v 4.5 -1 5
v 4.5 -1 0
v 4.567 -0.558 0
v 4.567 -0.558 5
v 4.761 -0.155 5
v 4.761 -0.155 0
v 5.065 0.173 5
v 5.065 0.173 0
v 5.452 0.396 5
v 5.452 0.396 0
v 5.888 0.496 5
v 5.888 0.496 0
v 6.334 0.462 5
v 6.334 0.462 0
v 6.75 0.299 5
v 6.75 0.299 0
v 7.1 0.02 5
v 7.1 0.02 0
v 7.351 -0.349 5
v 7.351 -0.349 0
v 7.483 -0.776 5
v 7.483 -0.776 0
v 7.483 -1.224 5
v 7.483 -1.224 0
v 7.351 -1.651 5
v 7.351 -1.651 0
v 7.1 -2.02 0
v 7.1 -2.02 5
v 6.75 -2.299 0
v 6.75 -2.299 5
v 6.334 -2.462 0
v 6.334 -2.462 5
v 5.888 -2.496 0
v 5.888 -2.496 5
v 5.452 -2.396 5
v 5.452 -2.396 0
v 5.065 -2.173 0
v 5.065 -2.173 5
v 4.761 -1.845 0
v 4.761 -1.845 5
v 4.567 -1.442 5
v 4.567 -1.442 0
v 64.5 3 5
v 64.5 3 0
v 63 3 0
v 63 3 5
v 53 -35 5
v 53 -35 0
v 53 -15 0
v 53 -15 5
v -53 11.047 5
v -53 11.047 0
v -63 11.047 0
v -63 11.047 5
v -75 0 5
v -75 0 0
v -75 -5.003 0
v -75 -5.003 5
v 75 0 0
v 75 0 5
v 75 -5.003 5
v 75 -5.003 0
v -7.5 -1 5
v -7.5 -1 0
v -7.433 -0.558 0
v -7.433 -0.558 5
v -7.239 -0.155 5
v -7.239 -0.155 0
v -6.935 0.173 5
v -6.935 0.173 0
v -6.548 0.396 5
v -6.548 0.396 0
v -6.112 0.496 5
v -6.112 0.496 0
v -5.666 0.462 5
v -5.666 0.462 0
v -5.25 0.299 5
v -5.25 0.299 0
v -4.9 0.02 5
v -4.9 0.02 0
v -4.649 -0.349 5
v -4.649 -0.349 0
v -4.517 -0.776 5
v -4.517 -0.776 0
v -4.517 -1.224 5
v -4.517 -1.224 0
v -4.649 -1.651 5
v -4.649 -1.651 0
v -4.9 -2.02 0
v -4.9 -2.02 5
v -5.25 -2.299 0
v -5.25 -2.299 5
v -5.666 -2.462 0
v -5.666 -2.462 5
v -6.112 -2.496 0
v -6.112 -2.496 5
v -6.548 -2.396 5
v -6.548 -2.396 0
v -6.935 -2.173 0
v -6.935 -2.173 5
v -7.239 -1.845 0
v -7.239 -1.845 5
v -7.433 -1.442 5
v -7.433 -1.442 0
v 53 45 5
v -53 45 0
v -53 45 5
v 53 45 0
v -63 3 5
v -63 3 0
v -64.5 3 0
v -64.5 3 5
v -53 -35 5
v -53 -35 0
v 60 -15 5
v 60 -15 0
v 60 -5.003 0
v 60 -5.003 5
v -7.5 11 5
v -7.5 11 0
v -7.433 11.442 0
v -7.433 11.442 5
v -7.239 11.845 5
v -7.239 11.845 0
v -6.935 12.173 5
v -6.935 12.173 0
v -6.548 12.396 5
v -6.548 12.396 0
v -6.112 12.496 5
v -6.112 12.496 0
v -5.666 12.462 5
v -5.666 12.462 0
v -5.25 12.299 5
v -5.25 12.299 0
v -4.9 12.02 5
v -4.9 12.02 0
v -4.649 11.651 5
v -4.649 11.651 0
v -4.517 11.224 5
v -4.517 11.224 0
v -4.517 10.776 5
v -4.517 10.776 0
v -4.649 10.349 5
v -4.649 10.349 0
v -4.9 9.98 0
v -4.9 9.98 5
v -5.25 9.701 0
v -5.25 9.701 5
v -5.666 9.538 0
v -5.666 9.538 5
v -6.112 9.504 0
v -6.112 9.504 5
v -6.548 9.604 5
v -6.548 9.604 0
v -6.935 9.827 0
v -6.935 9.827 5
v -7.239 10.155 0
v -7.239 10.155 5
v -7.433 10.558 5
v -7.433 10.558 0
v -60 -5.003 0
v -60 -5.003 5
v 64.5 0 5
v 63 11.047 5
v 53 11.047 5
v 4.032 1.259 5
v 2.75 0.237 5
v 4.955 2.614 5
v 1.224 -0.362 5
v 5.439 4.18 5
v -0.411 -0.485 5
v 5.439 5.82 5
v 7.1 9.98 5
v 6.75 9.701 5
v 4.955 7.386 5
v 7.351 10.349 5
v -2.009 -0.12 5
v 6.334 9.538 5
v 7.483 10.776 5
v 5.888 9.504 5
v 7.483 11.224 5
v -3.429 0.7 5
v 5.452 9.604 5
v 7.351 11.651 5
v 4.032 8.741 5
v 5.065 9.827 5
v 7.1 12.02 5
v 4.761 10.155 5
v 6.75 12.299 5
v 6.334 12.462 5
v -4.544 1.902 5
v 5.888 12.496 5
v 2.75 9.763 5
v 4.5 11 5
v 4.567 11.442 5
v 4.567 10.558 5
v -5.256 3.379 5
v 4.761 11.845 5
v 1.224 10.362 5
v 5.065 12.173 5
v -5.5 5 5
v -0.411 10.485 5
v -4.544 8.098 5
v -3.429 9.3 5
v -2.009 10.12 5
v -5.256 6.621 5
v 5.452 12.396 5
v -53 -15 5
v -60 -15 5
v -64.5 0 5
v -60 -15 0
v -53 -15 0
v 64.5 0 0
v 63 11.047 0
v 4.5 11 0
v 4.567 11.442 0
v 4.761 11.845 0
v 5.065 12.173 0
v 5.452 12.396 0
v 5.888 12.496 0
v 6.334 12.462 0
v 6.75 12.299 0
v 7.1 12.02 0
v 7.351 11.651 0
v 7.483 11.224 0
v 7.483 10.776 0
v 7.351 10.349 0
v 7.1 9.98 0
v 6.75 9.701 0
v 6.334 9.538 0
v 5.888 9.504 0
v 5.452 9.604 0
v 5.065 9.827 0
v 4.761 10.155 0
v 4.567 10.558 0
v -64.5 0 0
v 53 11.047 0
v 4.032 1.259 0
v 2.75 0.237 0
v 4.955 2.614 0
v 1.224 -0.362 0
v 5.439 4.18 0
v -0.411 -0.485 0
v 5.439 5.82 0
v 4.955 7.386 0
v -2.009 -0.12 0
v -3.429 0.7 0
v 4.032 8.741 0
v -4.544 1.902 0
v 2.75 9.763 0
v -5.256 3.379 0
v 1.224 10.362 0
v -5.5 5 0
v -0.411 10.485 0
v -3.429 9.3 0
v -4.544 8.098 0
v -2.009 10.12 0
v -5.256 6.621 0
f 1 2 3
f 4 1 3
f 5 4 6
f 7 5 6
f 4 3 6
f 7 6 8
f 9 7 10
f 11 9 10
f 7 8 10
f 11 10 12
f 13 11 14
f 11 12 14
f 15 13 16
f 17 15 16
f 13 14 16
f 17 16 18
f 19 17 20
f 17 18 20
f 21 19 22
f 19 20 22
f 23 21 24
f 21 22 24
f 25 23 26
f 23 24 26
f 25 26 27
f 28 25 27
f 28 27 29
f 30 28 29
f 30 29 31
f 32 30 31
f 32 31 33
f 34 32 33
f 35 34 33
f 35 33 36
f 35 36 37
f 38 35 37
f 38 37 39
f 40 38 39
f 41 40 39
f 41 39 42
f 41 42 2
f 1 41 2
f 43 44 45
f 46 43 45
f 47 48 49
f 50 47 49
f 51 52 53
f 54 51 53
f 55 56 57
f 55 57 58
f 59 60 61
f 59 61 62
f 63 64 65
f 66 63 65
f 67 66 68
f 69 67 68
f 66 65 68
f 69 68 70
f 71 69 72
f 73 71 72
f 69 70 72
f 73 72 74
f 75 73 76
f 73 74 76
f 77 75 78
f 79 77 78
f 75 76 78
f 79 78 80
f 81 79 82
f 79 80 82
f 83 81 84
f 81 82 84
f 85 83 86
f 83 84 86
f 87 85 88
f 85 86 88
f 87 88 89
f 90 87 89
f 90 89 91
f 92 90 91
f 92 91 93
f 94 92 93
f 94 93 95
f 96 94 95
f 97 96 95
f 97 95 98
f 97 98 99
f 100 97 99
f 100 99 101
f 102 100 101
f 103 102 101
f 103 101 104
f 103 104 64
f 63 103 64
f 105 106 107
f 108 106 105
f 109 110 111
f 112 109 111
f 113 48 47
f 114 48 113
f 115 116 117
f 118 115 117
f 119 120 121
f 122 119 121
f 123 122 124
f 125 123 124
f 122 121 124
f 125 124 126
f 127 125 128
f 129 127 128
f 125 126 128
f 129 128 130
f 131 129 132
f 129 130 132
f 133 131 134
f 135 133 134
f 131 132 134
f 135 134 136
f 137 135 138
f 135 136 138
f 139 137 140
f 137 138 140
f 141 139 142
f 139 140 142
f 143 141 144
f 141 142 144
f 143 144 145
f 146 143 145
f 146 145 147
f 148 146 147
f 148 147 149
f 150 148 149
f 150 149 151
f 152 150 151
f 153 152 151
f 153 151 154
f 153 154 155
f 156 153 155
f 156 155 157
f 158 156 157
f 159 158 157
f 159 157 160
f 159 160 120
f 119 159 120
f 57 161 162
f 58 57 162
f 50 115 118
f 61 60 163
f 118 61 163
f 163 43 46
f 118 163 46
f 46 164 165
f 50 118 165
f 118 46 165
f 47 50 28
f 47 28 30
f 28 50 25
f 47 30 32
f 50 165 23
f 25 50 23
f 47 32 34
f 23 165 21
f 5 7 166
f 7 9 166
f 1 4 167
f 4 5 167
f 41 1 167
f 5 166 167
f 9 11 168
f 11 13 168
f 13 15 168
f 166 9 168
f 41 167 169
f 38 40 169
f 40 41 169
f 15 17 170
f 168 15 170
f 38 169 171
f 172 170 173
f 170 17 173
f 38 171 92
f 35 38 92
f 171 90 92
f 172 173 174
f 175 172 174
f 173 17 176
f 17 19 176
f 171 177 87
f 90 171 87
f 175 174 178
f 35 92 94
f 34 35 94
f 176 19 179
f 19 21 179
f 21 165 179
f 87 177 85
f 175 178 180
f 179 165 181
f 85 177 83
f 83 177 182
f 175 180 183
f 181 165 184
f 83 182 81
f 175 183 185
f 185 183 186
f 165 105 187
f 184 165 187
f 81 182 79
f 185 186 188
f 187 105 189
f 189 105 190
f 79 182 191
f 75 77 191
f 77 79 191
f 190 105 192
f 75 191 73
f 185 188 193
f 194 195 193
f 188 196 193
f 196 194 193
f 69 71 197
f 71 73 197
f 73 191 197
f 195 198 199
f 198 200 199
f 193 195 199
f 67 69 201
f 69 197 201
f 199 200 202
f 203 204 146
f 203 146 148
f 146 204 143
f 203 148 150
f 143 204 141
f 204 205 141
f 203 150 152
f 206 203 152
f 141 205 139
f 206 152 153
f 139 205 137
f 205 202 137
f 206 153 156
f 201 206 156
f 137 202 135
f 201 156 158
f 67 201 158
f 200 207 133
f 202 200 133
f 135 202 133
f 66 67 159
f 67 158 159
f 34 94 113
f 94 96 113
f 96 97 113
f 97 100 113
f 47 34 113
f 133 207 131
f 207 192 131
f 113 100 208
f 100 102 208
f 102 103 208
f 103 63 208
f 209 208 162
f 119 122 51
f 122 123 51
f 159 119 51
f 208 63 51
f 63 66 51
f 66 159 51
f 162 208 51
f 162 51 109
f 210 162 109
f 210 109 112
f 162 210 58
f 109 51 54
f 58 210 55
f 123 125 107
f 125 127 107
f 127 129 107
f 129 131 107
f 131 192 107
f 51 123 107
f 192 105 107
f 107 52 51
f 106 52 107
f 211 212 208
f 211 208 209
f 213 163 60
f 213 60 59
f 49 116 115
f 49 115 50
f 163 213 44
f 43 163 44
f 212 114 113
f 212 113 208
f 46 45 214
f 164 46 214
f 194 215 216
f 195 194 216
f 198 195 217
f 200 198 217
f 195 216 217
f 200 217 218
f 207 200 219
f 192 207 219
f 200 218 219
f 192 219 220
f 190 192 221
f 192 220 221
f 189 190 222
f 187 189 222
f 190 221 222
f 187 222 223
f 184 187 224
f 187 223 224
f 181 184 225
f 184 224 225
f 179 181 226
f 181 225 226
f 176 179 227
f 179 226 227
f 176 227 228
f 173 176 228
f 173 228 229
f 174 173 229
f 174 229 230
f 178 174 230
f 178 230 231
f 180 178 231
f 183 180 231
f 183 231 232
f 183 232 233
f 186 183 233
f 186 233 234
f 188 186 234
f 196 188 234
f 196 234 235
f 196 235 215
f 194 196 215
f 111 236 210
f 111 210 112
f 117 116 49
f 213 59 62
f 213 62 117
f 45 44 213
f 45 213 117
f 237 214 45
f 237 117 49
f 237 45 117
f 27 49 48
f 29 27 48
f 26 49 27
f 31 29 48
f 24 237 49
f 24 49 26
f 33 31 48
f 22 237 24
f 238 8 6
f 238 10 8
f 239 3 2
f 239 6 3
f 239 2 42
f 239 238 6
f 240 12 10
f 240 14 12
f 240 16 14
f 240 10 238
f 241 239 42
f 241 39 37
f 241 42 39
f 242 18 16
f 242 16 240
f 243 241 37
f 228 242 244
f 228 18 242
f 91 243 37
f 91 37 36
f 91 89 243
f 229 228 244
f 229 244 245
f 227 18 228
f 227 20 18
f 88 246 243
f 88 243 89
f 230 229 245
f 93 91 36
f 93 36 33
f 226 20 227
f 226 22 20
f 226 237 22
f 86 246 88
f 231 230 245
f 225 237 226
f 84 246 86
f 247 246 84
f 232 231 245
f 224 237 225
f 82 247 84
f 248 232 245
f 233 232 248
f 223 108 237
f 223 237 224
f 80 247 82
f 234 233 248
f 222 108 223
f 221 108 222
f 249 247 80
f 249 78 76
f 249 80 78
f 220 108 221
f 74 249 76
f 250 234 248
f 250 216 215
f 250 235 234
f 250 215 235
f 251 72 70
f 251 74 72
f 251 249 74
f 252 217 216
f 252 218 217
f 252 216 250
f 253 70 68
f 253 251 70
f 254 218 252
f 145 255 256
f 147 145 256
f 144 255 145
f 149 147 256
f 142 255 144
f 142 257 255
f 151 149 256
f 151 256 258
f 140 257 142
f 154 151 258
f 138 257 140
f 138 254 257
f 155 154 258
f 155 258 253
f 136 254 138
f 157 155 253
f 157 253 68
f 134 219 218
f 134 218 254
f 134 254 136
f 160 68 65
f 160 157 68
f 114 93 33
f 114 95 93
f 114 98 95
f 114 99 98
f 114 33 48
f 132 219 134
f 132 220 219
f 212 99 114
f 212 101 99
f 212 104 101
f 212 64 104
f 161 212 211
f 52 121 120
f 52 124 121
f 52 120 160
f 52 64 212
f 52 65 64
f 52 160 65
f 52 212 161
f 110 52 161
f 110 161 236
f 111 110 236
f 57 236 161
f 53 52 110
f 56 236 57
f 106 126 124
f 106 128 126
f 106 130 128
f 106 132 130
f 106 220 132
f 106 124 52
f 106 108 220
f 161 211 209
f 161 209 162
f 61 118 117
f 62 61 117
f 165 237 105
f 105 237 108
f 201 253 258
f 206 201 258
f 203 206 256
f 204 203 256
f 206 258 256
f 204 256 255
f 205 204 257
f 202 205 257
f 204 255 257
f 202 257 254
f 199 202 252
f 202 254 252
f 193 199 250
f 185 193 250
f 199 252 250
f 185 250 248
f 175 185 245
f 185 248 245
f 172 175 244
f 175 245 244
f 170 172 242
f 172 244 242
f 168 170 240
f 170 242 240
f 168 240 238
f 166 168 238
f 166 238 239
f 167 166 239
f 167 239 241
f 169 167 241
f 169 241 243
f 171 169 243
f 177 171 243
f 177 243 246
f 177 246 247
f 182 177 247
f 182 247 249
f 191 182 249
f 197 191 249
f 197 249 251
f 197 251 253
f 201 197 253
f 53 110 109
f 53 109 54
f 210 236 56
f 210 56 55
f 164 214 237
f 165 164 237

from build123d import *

# Parameters (mm, degrees)
SKETCH_1_W          = 120
SKETCH_1_H          = 90
EXTRUDE_1_DEPTH     = 5
SKETCH_5_W          = 120
SKETCH_5_H          = 10
CUT_EXTRUDE_3_DEPTH = 10
SKETCH_10_W         = 5
SKETCH_10_H         = 5.002587902
EXTRUDE_3_DEPTH     = 15
SKETCH_12_W         = 5
SKETCH_12_H         = 5.002587902
EXTRUDE_4_DEPTH     = 15
SKETCH_14_W         = 3
SKETCH_14_H         = 15.404940373
EXTRUDE_5_DEPTH     = 5
SKETCH_16_W         = 5
SKETCH_16_H         = 29.952587902
CUT_EXTRUDE_5_DEPTH = 10
SKETCH_17_W         = 5
SKETCH_17_H         = 29.952587902
CUT_EXTRUDE_6_DEPTH = 10
SKETCH_18_W         = 10
SKETCH_18_H         = 4
SKETCH_18_W_2       = 7
SKETCH_18_H_2       = 20
CUT_EXTRUDE_7_DEPTH = 10
SKETCH_19_W         = 1.5
SKETCH_19_H         = 3
EXTRUDE_6_DEPTH     = 5
SKETCH_20_R         = 5.5
SKETCH_20_R_2       = 1.5
CUT_EXTRUDE_8_DEPTH = 10


with BuildPart() as part:
    # 草图1 → 凸台-拉伸1 (new body)
    with BuildSketch(Plane.XY):
        Rectangle(SKETCH_1_W, SKETCH_1_H)
    extrude(amount=EXTRUDE_1_DEPTH)

    # 草图5 → 切除-拉伸3 (cut)
    with BuildSketch(Plane(origin=(0, 0, 0), x_dir=(-1, 0, 0), z_dir=(0, 0, -1))):
        with Locations((0, -40)):
            Rectangle(SKETCH_5_W, SKETCH_5_H)
    extrude(amount=-CUT_EXTRUDE_3_DEPTH, mode=Mode.SUBTRACT)

    # 草图10 → 凸台-拉伸3 (add)
    with BuildSketch(Plane(origin=(60, 0, 0), x_dir=(0, 0, -1), z_dir=(1, 0, 0))):
        with Locations((-2.5, -2.501293951)):
            Rectangle(SKETCH_10_W, SKETCH_10_H)
    extrude(amount=EXTRUDE_3_DEPTH)

    # 草图12 → 凸台-拉伸4 (add)
    with BuildSketch(Plane.ZY.offset(60)):
        with Locations((2.5, -2.501293951)):
            Rectangle(SKETCH_12_W, SKETCH_12_H)
    extrude(amount=EXTRUDE_4_DEPTH)

    # 草图14 → 凸台-拉伸5 (add, through all)
    with BuildSketch(Plane(origin=(0, 0, 0), x_dir=(-1, 0, 0), z_dir=(0, 0, -1))):
        with Locations((-61.5, 7.702470187)):
            Rectangle(SKETCH_14_W, SKETCH_14_H)
        with Locations((61.5, 7.702470187)):
            Rectangle(SKETCH_14_W, SKETCH_14_H)
    extrude(amount=-EXTRUDE_5_DEPTH)

    # 草图16 → 切除-拉伸5 (cut)
    with BuildSketch(Plane(origin=(0, 0, 0), x_dir=(-1, 0, 0), z_dir=(0, 0, -1))):
        with Locations((60.5, 30.023706049)):
            Rectangle(SKETCH_16_W, SKETCH_16_H)
        with Locations((-60.5, 30.023706049)):
            Rectangle(SKETCH_16_W, SKETCH_16_H)
    extrude(amount=-CUT_EXTRUDE_5_DEPTH, mode=Mode.SUBTRACT)

    # 草图17 → 切除-拉伸6 (cut)
    with BuildSketch(Plane(origin=(0, 0, 0), x_dir=(-1, 0, 0), z_dir=(0, 0, -1))):
        with Locations((-55.5, 30.023706049)):
            Rectangle(SKETCH_17_W, SKETCH_17_H)
        with Locations((55.5, 30.023706049)):
            Rectangle(SKETCH_17_W, SKETCH_17_H)
    extrude(amount=-CUT_EXTRUDE_6_DEPTH, mode=Mode.SUBTRACT)

    # 草图18 → 切除-拉伸7 (cut)
    with BuildSketch(Plane(origin=(0, 0, 0), x_dir=(-1, 0, 0), z_dir=(0, 0, -1))):
        with Locations((-58, 13.047412098)):
            Rectangle(SKETCH_18_W, SKETCH_18_H)
        with Locations((-56.5, -25)):
            Rectangle(SKETCH_18_W_2, SKETCH_18_H_2)
        with Locations((56.5, -25)):
            Rectangle(SKETCH_18_W_2, SKETCH_18_H_2)
        with Locations((58, 13.047412098)):
            Rectangle(SKETCH_18_W, SKETCH_18_H)
    extrude(amount=-CUT_EXTRUDE_7_DEPTH, mode=Mode.SUBTRACT)

    # 草图19 → 凸台-拉伸6 (add, through all)
    with BuildSketch(Plane(origin=(0, 0, 0), x_dir=(-1, 0, 0), z_dir=(0, 0, -1))):
        with Locations((-63.75, 1.5)):
            Rectangle(SKETCH_19_W, SKETCH_19_H)
        with Locations((63.75, 1.5)):
            Rectangle(SKETCH_19_W, SKETCH_19_H)
    extrude(amount=-EXTRUDE_6_DEPTH)

    # 草图20 → 切除-拉伸8 (cut)
    with BuildSketch(Plane(origin=(0, 0, 0), x_dir=(-1, 0, 0), z_dir=(0, 0, -1))):
        with Locations((0, 5)):
            Circle(SKETCH_20_R)
        with Locations((6, 11)):
            Circle(SKETCH_20_R_2)
        with Locations((6, -1)):
            Circle(SKETCH_20_R_2)
        with Locations((-6, -1)):
            Circle(SKETCH_20_R_2)
        with Locations((-6, 11)):
            Circle(SKETCH_20_R_2)
    extrude(amount=-CUT_EXTRUDE_8_DEPTH, mode=Mode.SUBTRACT)


solid = part.part
